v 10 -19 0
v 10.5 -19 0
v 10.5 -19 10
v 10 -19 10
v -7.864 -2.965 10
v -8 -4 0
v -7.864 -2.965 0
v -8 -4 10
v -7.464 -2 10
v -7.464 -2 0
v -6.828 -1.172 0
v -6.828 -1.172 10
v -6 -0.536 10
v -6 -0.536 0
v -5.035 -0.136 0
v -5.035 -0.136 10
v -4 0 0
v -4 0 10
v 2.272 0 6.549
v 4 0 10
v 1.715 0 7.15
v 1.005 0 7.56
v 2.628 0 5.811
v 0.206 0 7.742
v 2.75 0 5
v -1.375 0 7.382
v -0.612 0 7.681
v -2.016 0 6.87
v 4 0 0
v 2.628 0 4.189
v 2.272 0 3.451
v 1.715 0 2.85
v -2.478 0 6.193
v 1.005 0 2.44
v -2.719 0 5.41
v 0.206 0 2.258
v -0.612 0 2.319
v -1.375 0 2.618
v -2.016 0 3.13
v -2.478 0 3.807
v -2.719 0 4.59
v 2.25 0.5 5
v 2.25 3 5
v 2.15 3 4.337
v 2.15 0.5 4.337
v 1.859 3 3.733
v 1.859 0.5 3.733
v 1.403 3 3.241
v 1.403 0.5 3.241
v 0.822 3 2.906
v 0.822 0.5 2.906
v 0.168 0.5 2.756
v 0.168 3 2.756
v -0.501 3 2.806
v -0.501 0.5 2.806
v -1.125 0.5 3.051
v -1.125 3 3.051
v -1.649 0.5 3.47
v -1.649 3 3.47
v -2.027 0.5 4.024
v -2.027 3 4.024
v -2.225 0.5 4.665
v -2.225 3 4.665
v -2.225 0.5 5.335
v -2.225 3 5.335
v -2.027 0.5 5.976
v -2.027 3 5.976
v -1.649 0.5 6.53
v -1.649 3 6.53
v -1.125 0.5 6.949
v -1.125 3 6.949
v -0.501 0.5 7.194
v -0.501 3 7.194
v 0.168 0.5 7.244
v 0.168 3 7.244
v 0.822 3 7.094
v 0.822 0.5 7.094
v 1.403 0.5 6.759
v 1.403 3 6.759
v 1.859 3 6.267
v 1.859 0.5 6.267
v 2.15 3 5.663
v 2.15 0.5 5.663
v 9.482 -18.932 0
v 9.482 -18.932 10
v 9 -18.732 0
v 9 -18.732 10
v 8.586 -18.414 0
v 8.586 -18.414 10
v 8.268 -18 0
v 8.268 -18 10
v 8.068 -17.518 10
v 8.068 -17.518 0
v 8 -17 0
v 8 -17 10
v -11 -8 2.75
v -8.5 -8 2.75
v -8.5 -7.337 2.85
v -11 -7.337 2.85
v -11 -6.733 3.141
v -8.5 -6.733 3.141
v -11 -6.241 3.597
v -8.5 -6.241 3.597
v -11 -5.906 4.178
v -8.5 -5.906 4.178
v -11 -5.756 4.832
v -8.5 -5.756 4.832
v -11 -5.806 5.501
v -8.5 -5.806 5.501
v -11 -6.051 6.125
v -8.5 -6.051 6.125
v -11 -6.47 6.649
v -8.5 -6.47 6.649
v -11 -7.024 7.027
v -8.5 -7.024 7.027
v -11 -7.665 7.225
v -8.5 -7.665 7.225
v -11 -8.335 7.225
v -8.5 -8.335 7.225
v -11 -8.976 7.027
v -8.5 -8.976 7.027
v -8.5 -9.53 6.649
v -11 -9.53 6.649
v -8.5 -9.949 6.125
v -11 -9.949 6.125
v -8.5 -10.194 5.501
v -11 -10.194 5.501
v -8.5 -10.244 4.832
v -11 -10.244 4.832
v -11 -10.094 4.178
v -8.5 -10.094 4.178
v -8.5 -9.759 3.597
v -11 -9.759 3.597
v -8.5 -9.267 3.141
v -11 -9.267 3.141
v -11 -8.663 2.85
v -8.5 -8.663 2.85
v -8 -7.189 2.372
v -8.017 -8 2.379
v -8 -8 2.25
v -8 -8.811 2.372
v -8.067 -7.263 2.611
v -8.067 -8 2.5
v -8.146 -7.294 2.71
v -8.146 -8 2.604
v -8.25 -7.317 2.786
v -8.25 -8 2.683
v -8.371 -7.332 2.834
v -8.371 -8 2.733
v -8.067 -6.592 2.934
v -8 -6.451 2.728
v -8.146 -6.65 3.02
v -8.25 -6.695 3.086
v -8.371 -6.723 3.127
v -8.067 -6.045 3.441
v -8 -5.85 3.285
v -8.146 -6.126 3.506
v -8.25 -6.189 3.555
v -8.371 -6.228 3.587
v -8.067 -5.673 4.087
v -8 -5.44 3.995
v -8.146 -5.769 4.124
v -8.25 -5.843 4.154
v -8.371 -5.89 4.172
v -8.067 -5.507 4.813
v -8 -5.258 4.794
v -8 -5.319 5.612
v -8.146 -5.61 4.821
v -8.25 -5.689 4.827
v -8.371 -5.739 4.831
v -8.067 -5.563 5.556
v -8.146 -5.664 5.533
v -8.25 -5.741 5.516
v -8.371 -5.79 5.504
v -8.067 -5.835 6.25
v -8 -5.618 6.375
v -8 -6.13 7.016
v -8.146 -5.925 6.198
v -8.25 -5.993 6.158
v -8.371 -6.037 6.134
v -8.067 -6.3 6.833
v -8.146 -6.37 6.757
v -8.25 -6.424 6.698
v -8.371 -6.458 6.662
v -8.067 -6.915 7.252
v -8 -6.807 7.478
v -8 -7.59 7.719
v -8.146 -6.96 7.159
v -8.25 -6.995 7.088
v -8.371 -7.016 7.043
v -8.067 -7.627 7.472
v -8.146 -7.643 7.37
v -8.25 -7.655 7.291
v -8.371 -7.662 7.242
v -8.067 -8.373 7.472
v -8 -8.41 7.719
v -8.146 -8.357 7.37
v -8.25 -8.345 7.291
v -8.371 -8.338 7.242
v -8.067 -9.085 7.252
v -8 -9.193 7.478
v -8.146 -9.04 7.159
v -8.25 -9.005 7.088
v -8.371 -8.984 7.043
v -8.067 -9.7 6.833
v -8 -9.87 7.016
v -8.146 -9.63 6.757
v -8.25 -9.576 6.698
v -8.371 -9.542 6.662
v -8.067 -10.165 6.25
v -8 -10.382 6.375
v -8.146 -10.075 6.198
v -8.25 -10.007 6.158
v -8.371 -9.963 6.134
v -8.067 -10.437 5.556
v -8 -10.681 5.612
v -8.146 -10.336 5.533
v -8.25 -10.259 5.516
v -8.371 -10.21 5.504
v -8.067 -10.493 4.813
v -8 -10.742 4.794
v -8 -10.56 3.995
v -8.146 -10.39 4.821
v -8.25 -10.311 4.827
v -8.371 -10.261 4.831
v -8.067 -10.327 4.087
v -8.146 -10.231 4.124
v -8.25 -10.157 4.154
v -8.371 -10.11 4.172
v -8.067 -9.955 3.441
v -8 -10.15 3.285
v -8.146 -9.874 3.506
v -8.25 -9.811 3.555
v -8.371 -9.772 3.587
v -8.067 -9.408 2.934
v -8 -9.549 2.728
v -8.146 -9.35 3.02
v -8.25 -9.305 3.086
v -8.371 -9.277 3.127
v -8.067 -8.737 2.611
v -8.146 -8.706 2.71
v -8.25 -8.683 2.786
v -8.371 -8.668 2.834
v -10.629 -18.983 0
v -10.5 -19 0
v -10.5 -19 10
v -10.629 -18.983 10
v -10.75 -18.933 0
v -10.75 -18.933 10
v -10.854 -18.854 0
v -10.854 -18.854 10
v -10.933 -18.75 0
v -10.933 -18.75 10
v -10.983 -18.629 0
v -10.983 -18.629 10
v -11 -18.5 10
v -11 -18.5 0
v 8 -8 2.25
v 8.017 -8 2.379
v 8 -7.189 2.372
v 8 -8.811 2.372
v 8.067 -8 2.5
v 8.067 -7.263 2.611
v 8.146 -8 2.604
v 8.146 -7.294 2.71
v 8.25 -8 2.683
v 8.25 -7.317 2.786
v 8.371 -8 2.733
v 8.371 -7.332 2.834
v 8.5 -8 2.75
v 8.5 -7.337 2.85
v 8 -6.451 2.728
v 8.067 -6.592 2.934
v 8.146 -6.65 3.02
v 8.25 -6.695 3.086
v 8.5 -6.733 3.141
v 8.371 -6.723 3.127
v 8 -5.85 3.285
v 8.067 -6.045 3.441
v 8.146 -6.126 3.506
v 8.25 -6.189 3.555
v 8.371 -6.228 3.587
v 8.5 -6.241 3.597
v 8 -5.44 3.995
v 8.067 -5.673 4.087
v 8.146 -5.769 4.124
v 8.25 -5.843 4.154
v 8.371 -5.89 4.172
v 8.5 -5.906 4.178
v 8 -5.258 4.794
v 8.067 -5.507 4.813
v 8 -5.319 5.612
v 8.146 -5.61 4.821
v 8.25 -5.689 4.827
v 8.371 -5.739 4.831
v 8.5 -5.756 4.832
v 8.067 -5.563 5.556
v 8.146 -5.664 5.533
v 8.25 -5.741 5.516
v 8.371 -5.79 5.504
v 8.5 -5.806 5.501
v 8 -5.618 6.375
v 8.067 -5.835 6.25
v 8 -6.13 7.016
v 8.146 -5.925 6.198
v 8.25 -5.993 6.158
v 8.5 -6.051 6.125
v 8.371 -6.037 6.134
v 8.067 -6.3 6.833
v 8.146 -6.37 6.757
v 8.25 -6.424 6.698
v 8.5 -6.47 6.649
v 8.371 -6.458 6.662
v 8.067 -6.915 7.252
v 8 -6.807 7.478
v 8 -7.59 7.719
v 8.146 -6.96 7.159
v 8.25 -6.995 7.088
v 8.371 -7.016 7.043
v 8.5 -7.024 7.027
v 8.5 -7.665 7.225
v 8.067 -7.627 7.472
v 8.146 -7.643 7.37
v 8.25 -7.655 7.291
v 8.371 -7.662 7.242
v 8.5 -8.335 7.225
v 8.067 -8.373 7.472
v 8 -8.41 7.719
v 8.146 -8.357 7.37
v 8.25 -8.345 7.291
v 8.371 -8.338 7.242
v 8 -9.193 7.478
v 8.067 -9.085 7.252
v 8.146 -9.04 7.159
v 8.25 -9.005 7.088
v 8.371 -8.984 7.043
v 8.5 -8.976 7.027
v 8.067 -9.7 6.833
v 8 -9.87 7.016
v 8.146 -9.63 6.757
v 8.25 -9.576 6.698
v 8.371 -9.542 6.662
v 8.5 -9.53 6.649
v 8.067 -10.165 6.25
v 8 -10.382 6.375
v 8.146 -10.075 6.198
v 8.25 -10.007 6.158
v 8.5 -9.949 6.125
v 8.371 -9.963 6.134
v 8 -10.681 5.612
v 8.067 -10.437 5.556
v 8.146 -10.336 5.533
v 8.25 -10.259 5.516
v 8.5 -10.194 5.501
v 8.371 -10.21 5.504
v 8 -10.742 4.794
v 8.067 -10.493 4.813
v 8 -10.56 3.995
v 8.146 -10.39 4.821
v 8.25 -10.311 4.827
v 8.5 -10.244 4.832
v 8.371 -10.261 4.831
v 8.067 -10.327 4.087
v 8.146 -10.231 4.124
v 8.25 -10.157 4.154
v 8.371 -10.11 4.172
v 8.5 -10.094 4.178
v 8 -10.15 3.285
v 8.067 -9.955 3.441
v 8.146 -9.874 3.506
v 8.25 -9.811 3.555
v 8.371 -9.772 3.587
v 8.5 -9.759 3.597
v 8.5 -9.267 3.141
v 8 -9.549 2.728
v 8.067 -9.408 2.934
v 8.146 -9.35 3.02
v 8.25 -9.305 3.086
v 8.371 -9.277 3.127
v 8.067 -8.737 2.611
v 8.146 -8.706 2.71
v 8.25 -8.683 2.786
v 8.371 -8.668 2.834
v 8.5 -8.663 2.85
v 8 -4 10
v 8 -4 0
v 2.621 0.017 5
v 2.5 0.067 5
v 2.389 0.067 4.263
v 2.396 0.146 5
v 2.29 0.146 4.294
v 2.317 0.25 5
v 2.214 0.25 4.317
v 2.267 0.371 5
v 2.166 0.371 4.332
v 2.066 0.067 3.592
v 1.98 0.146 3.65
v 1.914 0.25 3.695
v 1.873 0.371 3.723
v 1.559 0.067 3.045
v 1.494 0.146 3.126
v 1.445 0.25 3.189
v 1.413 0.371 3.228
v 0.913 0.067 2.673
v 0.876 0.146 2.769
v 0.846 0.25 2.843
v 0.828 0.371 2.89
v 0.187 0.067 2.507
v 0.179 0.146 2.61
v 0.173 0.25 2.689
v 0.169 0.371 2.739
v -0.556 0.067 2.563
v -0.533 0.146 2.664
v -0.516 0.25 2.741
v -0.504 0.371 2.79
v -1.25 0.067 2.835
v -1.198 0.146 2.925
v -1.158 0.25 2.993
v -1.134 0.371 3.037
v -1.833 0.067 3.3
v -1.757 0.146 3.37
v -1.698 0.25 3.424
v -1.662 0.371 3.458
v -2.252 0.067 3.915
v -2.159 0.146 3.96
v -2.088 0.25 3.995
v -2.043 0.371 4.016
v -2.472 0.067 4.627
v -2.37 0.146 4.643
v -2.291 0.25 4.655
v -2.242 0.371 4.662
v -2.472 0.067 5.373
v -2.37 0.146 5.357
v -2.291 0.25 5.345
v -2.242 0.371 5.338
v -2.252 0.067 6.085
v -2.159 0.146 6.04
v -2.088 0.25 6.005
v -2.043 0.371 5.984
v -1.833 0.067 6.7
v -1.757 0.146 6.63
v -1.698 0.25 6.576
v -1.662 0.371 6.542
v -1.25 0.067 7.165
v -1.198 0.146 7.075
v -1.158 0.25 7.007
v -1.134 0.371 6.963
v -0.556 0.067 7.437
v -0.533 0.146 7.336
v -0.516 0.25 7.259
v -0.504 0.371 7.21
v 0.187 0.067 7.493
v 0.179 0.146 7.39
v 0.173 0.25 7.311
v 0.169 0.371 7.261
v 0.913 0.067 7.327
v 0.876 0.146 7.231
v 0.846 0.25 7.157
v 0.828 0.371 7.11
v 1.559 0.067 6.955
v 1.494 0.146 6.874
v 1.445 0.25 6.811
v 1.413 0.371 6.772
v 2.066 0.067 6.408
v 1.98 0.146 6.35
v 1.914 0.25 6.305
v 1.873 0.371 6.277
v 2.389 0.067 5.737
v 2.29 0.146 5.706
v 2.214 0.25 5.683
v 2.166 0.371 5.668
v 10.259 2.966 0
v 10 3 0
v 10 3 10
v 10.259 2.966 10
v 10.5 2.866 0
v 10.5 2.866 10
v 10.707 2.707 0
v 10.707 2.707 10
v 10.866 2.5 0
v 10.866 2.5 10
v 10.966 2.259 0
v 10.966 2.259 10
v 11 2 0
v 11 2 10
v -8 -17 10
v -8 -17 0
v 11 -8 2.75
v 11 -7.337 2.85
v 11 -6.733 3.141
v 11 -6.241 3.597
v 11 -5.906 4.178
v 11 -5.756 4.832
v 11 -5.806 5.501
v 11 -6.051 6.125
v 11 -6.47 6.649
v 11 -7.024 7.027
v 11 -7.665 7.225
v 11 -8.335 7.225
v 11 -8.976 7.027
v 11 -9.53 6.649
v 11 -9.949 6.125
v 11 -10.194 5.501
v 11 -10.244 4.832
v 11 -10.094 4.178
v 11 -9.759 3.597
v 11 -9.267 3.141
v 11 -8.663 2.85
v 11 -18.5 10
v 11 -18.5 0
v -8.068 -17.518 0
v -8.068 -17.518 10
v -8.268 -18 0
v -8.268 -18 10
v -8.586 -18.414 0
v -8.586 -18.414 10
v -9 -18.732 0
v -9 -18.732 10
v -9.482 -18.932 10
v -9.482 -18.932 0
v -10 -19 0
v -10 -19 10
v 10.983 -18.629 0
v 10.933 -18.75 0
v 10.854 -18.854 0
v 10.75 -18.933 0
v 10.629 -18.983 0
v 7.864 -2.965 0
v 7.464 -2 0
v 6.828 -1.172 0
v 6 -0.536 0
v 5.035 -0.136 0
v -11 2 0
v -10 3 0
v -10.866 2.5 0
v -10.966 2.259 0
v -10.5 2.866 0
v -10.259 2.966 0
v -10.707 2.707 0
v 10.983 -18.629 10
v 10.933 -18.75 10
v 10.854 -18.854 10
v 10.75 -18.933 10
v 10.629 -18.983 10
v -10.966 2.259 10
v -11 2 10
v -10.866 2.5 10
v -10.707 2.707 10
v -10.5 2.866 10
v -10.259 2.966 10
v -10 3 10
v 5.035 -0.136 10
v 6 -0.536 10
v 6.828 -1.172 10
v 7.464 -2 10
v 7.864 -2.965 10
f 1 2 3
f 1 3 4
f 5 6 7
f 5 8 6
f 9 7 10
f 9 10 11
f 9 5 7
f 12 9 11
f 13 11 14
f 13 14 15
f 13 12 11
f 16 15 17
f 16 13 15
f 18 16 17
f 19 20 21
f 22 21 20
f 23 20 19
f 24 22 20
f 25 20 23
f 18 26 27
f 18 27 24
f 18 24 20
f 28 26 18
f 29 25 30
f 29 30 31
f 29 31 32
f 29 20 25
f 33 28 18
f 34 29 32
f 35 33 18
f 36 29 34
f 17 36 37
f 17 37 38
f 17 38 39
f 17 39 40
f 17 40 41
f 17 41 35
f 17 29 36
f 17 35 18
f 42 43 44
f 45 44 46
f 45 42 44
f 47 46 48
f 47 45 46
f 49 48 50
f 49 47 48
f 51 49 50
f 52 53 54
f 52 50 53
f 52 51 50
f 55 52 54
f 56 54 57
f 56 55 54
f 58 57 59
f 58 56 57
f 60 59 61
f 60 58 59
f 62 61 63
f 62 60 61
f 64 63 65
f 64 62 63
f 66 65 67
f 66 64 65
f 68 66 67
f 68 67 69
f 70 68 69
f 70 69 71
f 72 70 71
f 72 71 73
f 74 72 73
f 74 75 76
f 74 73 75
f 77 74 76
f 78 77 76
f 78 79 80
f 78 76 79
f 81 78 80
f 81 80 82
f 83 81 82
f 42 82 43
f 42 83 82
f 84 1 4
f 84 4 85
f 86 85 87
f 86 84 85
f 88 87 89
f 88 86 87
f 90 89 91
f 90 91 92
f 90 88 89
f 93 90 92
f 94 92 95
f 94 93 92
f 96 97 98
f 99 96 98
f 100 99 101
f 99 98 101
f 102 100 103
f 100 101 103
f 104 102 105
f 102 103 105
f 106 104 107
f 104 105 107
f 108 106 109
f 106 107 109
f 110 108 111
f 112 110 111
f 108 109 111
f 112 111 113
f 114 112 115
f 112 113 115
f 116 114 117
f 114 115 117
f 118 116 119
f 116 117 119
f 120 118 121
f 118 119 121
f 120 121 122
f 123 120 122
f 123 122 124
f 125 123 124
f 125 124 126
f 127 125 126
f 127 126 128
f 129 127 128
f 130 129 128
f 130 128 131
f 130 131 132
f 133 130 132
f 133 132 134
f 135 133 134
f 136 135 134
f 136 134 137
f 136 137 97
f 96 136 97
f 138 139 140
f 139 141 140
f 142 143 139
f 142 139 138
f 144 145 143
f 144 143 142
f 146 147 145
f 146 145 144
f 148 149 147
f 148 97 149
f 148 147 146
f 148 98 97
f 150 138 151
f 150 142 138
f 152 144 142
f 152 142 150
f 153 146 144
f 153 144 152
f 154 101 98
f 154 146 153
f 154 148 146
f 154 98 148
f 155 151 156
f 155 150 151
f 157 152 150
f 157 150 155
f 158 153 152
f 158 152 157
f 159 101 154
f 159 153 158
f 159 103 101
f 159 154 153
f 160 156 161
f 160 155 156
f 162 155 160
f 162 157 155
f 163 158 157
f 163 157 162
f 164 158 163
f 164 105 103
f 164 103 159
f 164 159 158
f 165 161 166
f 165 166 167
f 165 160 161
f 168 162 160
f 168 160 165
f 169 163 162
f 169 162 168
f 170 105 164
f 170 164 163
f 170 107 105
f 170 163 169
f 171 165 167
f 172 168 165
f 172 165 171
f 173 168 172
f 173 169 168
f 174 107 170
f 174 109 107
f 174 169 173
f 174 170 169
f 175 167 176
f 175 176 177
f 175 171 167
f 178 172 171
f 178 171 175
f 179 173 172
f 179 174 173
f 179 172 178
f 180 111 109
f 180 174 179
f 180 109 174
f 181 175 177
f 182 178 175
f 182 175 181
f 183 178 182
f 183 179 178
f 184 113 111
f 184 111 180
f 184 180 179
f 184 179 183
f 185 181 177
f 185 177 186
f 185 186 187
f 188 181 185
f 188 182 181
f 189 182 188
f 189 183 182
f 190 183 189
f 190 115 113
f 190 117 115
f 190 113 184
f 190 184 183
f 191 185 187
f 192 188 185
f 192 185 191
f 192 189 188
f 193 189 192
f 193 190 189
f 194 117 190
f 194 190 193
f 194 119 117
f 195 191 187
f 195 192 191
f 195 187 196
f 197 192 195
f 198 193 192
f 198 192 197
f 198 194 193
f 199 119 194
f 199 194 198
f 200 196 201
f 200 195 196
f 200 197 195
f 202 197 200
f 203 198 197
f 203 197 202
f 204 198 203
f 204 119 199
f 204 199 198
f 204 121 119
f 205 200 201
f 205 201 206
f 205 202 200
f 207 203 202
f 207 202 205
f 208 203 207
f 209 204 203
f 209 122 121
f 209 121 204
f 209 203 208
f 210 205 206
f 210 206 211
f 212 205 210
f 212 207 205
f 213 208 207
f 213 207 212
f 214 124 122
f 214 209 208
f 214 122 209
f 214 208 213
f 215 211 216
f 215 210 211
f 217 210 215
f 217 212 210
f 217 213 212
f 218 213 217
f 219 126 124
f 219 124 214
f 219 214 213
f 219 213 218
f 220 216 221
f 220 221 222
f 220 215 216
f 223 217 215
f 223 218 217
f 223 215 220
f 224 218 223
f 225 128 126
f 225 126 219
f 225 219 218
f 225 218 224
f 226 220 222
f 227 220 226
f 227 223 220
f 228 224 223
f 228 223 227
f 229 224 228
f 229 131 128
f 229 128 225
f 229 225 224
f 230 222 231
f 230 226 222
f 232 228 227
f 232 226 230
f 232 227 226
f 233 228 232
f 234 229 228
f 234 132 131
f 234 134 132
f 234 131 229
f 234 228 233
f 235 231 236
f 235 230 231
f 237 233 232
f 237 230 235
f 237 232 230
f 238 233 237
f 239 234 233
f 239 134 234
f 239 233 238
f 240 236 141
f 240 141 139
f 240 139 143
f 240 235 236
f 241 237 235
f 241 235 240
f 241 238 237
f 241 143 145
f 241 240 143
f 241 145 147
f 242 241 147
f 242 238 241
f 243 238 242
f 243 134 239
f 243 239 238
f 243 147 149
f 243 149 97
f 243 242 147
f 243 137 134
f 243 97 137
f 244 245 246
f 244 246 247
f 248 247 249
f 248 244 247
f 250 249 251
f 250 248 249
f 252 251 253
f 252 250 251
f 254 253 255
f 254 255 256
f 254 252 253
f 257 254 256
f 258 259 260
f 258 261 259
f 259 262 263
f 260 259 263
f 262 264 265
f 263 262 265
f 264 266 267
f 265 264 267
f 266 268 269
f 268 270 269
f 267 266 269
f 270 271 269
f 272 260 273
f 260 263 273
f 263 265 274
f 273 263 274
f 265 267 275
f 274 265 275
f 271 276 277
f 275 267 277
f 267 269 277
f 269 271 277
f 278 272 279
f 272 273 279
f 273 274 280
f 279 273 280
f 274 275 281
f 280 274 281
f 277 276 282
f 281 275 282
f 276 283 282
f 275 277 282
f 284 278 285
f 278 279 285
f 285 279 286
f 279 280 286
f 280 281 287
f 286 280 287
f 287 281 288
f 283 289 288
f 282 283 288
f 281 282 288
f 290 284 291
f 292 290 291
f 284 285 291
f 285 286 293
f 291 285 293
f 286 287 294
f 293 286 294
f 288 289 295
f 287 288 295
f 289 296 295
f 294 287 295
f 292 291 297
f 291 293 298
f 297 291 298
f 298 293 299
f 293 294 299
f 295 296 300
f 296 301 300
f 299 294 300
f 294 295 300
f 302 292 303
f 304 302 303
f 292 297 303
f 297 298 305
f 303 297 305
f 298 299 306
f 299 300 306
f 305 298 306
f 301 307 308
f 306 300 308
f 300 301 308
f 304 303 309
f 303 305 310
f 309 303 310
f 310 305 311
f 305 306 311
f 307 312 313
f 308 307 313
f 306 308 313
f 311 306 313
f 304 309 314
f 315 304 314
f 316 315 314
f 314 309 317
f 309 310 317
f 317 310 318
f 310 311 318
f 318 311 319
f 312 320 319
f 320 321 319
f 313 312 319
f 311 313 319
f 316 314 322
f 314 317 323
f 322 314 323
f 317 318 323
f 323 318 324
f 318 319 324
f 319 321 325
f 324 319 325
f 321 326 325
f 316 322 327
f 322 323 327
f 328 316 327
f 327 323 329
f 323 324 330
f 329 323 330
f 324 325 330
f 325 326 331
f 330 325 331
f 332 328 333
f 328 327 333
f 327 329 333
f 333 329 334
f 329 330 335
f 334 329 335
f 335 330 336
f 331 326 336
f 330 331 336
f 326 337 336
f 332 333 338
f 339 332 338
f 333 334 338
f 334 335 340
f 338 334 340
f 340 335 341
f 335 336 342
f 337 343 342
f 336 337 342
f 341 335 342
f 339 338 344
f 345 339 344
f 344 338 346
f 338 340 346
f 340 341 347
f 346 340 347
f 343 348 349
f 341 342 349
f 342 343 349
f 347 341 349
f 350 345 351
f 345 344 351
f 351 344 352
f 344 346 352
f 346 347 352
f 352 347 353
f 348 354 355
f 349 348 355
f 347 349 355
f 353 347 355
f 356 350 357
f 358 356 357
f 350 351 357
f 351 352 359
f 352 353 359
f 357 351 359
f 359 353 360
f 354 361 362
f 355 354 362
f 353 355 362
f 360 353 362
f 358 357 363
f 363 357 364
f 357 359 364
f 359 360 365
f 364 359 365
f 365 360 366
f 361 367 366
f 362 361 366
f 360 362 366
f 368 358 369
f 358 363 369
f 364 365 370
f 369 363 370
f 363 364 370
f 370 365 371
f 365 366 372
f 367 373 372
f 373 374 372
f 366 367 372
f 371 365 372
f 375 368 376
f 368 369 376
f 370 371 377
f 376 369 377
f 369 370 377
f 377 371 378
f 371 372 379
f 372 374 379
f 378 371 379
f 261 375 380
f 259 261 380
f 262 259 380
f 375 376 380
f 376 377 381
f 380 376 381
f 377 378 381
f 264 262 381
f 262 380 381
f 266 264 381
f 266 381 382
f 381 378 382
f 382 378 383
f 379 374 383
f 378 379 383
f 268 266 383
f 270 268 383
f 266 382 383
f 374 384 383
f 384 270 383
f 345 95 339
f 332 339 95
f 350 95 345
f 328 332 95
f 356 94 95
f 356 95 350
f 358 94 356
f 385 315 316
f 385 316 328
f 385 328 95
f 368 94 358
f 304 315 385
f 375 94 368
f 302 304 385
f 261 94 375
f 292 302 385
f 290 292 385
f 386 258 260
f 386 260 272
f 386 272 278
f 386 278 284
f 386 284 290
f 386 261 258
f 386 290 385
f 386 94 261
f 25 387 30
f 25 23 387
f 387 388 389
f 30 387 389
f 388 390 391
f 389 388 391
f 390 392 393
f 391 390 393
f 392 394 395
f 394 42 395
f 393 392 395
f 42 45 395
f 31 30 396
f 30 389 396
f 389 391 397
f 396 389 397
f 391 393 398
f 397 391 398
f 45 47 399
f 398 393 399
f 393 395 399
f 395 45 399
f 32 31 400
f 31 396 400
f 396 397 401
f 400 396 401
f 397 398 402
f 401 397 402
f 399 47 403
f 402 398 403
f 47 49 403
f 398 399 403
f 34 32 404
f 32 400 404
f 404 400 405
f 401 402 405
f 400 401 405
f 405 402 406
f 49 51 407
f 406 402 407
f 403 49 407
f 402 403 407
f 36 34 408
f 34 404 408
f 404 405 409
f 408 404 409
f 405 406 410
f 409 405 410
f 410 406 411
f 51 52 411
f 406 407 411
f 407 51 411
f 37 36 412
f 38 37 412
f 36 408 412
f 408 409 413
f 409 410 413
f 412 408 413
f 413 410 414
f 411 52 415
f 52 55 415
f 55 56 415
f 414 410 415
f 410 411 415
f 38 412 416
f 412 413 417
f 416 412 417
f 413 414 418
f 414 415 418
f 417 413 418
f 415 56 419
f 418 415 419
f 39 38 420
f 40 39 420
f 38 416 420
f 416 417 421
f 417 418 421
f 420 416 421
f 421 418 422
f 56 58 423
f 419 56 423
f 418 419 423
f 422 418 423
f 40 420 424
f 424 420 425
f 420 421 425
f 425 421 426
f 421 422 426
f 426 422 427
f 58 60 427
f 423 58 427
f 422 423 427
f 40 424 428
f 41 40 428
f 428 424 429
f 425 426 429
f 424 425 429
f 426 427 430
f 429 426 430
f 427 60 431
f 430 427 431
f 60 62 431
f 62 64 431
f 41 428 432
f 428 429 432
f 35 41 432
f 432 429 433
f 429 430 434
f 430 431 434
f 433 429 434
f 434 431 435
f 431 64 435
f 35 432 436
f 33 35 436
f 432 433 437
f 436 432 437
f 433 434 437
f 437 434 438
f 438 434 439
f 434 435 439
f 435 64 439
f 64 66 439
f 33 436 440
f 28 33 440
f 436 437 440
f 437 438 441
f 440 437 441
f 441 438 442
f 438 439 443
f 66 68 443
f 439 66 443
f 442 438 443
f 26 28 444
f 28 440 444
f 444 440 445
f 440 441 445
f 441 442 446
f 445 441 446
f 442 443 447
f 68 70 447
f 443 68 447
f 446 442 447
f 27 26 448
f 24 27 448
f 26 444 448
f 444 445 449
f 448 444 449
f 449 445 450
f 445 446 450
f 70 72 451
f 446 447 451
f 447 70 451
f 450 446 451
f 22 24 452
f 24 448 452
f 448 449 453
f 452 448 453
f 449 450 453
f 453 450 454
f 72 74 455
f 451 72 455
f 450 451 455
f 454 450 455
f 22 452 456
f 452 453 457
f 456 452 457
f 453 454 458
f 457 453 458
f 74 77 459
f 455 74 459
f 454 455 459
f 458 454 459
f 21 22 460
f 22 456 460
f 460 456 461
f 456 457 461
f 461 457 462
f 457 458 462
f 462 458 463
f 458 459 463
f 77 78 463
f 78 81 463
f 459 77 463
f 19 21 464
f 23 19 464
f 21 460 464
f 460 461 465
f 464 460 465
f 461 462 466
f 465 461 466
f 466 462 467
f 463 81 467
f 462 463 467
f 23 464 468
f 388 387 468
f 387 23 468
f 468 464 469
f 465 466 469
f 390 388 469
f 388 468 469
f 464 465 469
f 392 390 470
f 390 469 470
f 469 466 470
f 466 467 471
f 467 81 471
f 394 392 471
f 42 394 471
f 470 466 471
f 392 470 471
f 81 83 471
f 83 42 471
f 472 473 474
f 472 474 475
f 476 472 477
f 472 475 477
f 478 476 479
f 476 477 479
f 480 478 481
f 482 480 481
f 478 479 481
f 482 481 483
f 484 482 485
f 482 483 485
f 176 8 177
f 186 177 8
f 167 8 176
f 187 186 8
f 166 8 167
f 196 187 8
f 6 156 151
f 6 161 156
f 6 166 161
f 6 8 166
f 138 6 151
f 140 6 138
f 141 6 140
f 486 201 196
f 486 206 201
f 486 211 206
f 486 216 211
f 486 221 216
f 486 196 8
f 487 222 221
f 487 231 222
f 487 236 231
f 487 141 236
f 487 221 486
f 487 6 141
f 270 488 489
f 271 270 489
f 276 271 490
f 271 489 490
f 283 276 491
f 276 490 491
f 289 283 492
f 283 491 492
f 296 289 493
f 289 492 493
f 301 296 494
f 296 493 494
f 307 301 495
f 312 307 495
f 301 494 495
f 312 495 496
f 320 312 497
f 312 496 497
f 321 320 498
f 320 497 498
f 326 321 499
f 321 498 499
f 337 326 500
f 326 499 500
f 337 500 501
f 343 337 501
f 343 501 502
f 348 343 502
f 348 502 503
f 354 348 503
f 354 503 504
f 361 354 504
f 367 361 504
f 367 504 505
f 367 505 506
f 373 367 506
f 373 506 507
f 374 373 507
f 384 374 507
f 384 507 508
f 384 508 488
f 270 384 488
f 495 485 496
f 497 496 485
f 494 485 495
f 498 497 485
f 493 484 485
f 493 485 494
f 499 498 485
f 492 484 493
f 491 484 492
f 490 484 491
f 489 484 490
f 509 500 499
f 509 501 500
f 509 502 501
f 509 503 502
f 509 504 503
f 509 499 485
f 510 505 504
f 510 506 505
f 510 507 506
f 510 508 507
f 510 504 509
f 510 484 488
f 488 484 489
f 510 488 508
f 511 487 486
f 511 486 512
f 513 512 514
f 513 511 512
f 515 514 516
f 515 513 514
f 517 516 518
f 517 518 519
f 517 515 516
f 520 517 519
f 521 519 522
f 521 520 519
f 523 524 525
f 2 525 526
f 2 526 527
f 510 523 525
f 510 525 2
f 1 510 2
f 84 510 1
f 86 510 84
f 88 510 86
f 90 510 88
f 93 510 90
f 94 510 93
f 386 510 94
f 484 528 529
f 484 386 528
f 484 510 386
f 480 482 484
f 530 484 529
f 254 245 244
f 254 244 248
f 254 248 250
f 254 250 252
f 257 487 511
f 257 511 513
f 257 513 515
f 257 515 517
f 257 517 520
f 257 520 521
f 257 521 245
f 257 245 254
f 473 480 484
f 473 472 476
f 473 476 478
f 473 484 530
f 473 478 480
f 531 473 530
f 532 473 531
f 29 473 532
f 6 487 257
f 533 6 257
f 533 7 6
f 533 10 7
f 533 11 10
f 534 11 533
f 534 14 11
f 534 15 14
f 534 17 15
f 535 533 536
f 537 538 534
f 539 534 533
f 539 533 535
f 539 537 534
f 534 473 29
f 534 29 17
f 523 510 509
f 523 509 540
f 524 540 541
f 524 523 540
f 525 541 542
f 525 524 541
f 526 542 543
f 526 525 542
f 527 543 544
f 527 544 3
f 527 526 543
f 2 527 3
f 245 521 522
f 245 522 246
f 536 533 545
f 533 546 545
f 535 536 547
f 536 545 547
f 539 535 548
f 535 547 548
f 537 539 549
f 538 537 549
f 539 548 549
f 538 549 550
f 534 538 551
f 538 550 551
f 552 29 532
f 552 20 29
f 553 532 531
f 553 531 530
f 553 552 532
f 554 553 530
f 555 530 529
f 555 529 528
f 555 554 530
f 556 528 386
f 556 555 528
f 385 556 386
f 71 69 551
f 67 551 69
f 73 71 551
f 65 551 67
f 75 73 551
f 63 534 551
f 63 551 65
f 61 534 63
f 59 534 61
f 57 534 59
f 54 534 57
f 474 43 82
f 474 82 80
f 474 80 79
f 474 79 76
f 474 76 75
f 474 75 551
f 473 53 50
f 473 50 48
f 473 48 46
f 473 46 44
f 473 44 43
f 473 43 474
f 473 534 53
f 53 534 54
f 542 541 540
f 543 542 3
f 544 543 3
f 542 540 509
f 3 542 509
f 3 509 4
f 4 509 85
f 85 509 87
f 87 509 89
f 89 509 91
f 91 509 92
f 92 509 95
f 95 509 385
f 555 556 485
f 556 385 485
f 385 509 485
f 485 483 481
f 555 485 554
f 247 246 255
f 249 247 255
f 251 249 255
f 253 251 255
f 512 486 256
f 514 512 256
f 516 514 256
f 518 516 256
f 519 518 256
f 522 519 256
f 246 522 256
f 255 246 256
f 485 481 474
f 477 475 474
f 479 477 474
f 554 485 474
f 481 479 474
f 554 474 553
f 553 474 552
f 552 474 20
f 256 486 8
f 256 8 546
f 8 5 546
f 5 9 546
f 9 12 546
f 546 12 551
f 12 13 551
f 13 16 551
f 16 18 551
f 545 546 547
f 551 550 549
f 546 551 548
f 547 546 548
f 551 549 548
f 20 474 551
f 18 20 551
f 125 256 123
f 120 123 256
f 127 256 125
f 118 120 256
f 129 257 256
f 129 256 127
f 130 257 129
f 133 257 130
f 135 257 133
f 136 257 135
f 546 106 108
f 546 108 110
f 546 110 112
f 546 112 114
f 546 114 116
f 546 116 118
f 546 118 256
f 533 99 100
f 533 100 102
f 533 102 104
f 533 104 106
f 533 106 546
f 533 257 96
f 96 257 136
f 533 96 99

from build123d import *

# Parameters (mm, degrees)
EXTRUDE_1_DEPTH     = 10
SKETCH_4_R          = 2.25
CUT_EXTRUDE_1_DEPTH = 10
SKETCH_2_R          = 2.25
CUT_EXTRUDE_2_DEPTH = 27
FILLET_2_R          = 0.5
FILLET_3_R          = 1
FILLET_4_R          = 4


with BuildPart() as part:
    # 草图1 → 凸台-拉伸1 (new body)
    with BuildSketch(Plane.XY):
        with BuildLine():
            Line((-8, 0), (-8, -17))
            ThreePointArc((-8, -17), (-8.585786438, -18.414213562), (-10, -19))
            Line((-10, -19), (-10.5, -19))
            ThreePointArc((-10.5, -19), (-10.853553391, -18.853553391), (-11, -18.5))
            Line((-11, -18.5), (-11, 3))
            Line((-11, 3), (11, 3))
            Line((11, 3), (11, -18.5))
            ThreePointArc((11, -18.5), (10.853553391, -18.853553391), (10.5, -19))
            Line((10.5, -19), (10, -19))
            ThreePointArc((10, -19), (8.585786438, -18.414213562), (8, -17))
            Line((8, -17), (8, 0))
            Line((8, 0), (-8, 0))
        make_face()
    extrude(amount=EXTRUDE_1_DEPTH)

    # 草图4 → 切除-拉伸1 (cut)
    with BuildSketch(Plane(origin=(0, 0, 0), x_dir=(1, 0, 0), z_dir=(0, 1, 0))):
        with Locations((0, -5)):
            Circle(SKETCH_4_R)
    extrude(amount=CUT_EXTRUDE_1_DEPTH, mode=Mode.SUBTRACT)

    # 草图2 → 切除-拉伸2 (cut)
    with BuildSketch(Plane(origin=(11, 0, 0), x_dir=(0, 0, -1), z_dir=(1, 0, 0))):
        with Locations((-5, -8)):
            Circle(SKETCH_2_R)
    extrude(amount=-CUT_EXTRUDE_2_DEPTH, mode=Mode.SUBTRACT)

    # 圆角2
    fillet_2_edges = [part.edges().sort_by_distance(p)[0] for p in [
        (-2.25, 0, 5),
        (-8, -8, 7.25),
        (8, -8, 7.25),
    ]]
    fillet(fillet_2_edges, radius=FILLET_2_R)

    # 圆角3
    fillet_3_edges = [part.edges().sort_by_distance(p)[0] for p in [
        (-11, 3, 5),
        (11, 3, 5),
    ]]
    fillet(fillet_3_edges, radius=FILLET_3_R)

    # 圆角4
    fillet_4_edges = [part.edges().sort_by_distance(p)[0] for p in [
        (8, 0, 5),
        (-8, 0, 5),
    ]]
    fillet(fillet_4_edges, radius=FILLET_4_R)


solid = part.part
